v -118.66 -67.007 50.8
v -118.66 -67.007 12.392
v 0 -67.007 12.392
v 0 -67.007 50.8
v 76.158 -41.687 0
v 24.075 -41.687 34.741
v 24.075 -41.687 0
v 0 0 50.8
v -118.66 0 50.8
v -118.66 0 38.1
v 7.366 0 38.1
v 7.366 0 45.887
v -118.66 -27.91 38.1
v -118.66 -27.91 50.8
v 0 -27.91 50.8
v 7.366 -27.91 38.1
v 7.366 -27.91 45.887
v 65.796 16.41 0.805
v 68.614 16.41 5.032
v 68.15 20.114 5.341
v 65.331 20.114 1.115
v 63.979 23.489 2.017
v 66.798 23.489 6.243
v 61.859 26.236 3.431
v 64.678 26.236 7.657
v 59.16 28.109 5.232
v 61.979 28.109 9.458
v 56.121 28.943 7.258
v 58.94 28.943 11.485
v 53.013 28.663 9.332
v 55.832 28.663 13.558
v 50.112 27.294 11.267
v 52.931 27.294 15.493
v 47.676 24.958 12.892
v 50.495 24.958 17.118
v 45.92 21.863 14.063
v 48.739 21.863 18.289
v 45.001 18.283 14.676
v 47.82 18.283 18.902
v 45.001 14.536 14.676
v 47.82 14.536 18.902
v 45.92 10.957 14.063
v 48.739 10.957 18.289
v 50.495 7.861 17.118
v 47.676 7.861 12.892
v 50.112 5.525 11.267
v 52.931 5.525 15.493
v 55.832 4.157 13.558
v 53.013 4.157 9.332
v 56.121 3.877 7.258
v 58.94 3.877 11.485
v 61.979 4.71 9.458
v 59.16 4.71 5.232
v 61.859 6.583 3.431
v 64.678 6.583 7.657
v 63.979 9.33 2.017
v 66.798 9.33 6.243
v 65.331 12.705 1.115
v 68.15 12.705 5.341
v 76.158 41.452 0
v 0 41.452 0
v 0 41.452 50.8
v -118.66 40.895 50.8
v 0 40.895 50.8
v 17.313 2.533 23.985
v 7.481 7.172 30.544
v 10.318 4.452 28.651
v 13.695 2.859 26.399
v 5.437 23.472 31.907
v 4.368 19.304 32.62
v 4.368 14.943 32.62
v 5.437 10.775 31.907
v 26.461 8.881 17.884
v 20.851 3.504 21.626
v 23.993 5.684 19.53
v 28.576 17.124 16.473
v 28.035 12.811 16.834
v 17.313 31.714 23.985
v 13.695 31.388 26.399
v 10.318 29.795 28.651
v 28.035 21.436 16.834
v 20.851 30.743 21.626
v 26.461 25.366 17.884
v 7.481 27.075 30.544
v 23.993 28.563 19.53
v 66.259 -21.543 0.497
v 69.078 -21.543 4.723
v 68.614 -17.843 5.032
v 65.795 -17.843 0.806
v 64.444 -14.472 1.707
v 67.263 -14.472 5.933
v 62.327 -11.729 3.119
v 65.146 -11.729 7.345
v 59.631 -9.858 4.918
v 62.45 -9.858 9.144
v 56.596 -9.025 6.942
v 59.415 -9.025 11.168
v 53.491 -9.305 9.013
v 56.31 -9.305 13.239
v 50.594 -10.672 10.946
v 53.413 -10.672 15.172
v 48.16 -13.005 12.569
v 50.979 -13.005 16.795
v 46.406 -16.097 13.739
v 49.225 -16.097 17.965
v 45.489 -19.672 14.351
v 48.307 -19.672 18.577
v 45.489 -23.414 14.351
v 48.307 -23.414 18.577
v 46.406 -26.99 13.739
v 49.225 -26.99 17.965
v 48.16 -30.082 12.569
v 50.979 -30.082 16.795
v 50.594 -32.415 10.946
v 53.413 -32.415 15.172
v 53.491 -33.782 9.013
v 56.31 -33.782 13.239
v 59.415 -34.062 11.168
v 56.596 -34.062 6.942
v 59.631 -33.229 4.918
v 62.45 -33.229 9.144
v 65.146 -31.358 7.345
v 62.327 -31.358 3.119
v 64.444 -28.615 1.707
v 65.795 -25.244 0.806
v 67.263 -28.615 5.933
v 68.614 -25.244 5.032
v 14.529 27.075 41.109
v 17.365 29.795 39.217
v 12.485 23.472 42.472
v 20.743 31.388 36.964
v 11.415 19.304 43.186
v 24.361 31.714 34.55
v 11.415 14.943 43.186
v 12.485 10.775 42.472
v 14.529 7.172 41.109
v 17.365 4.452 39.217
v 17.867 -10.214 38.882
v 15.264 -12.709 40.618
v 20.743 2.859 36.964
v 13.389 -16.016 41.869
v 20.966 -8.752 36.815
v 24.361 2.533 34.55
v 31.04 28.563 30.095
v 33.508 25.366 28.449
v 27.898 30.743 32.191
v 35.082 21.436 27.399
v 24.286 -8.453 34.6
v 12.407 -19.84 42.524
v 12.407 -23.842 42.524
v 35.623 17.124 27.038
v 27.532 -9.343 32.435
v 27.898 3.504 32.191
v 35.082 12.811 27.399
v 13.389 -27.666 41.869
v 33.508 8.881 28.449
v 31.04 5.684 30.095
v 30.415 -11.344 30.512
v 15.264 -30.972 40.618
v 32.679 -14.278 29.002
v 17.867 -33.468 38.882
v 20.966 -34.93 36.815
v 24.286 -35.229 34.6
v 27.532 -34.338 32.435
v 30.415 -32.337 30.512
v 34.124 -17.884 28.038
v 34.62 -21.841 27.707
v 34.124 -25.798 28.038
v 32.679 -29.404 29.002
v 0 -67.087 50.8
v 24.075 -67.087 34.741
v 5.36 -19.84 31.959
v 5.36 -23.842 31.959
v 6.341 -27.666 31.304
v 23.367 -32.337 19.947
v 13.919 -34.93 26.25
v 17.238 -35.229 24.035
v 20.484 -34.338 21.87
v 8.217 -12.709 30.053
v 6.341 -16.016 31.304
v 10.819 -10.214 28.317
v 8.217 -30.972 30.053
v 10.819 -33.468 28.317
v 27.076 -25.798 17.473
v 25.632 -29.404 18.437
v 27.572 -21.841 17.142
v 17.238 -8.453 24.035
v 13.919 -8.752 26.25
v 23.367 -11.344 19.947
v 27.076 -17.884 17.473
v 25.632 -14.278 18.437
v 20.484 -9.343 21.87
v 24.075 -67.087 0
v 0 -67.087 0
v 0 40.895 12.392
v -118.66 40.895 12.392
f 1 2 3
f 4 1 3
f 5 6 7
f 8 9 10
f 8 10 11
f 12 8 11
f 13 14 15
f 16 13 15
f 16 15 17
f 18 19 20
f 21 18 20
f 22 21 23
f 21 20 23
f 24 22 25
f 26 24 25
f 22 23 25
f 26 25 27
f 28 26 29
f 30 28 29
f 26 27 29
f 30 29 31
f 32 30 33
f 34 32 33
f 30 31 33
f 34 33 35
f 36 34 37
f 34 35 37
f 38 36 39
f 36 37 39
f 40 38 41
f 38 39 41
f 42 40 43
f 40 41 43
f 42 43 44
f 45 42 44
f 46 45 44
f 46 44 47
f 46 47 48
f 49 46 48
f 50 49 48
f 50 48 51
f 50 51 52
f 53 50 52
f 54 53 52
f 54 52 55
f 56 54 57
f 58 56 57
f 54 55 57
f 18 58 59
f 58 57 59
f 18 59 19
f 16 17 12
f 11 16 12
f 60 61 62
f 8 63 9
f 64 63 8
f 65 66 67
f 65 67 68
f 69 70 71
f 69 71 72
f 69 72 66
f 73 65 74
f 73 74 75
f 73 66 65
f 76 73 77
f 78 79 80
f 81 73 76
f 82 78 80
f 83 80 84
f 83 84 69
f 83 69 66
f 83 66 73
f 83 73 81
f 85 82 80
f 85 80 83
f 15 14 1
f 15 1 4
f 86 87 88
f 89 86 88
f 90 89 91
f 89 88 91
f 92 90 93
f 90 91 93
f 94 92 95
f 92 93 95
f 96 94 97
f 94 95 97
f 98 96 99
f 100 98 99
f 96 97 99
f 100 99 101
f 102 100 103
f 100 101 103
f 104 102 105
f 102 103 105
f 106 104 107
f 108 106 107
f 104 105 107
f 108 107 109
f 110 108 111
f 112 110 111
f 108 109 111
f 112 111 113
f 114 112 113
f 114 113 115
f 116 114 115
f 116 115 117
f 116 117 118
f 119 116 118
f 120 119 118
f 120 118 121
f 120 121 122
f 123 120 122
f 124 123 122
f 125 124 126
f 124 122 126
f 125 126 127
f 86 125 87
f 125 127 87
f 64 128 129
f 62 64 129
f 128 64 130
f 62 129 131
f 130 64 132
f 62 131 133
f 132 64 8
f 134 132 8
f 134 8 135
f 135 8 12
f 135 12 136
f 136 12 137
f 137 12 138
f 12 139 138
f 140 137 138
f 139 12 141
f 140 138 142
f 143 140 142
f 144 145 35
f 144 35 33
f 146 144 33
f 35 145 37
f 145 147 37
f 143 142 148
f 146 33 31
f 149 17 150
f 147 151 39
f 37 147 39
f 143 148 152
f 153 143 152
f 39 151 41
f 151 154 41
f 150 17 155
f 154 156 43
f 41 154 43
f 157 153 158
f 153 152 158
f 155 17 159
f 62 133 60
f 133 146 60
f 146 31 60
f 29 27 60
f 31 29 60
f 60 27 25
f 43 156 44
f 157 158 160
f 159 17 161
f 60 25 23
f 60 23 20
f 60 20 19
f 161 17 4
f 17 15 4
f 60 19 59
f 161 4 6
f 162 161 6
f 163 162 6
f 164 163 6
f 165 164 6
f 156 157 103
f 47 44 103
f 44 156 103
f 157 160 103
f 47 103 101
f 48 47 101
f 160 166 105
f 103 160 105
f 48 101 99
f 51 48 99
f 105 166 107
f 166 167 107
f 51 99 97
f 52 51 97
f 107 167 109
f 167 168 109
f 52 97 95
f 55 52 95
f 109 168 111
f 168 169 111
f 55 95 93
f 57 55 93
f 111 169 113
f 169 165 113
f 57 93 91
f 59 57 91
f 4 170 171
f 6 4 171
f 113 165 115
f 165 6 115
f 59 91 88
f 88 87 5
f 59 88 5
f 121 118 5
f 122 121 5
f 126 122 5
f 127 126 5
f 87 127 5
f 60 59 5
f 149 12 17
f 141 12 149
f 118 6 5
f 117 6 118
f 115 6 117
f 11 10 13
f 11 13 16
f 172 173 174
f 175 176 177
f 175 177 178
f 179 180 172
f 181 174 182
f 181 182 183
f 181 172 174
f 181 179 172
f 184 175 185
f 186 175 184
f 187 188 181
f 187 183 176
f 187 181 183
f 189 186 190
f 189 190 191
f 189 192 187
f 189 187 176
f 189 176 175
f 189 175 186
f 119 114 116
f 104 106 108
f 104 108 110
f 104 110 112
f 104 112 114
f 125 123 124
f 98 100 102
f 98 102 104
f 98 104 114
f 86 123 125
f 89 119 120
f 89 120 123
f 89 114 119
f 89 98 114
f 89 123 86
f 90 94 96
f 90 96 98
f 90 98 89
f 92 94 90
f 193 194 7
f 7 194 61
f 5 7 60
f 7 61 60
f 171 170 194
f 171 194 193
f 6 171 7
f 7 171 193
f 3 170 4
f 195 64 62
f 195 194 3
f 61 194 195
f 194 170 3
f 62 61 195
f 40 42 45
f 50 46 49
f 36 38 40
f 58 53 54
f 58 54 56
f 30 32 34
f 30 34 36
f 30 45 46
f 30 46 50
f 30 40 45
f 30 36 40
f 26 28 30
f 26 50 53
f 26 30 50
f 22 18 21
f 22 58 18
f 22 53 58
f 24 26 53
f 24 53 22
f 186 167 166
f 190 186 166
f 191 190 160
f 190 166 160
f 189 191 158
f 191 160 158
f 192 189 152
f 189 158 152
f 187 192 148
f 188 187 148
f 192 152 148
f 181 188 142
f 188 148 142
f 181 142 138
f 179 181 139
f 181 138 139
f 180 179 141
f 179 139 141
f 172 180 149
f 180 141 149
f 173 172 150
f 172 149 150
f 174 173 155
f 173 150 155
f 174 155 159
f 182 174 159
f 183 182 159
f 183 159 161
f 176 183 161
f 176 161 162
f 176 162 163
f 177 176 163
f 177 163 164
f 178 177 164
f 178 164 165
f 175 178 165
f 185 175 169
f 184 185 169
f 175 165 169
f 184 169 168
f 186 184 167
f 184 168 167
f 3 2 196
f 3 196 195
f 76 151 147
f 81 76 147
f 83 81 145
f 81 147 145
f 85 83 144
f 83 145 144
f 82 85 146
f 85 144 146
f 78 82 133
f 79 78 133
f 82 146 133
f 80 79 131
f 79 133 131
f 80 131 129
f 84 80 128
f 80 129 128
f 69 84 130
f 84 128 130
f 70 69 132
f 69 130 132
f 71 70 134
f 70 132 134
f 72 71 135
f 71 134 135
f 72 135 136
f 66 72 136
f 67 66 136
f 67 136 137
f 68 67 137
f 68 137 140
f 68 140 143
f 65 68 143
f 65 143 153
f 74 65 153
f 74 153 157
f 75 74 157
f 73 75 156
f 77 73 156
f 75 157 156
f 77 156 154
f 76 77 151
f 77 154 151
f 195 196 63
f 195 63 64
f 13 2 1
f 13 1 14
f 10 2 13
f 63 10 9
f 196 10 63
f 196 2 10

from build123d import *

# Parameters (mm, degrees)
F0_W      = 76.1575698853
F0_H      = 108.5386313498
F1_DEPTH  = 50.8
F3_DEPTH  = 118.872
F5_DEPTH  = 25.4
F6_R      = 12.5535289189
F7_DEPTH  = 5.08
F8_R      = 12.5680957502
F9_DEPTH  = 5.08
F10_R     = 13.425374539
F11_DEPTH = 12.7
F12_R     = 14.6312815901
F13_DEPTH = 12.7
F14_W     = 118.6601817608
F14_H     = 107.9017259181
F15_DEPTH = 50.8
F16_W     = 126.0260776617
F16_H     = 27.9104653746
F17_DEPTH = 12.7
F18_W     = 118.6601817608
F18_H     = 12.3918522149
F19_DEPTH = 143.764


with BuildPart() as f1:
    # F0 (on Top) → F1 (new body)
    with BuildSketch(Plane.XY):
        with Locations((38.0787849426, -12.8173213452)):
            Rectangle(F0_W, F0_H)
    extrude(amount=F1_DEPTH)

    # F2 (on face) → F3 (cut)
    with BuildSketch(Plane.XZ.offset(67.0866370201)):
        Polygon((76.1575698853, 50.8), (0, 50.8), (76.1575698853, 0), align=None)
    extrude(amount=-F3_DEPTH, mode=Mode.SUBTRACT)

    # F4 (on face) → F5 (cut)
    with BuildSketch(Plane.XZ.offset(67.0866370201)):
        Polygon((76.1575698853, 0), (24.0748073295, 34.7411864877), (24.0748073295, 0), align=None)
    extrude(amount=-F5_DEPTH, mode=Mode.SUBTRACT)

    # F6 (on face) → F7 (cut)
    with BuildSketch(Plane(origin=(23.4511739981, 0, 35.1571736743), x_dir=(0.8319076559, 0, -0.5549140943), z_dir=(0.5549140943, 0, 0.8319076559))):
        with Locations((42.292021215, -21.5434860438)):
            Circle(F6_R)
    extrude(amount=-F7_DEPTH, mode=Mode.SUBTRACT)

    # F8 (on face) → F9 (cut)
    with BuildSketch(Plane(origin=(23.4511739981, 0, 35.1571736743), x_dir=(0.8319076559, 0, -0.5549140943), z_dir=(0.5549140943, 0, 0.8319076559))):
        with Locations((41.7207404971, 16.4096038789)):
            Circle(F8_R)
    extrude(amount=-F9_DEPTH, mode=Mode.SUBTRACT)

    # F10 (on face) → F11 (cut)
    with BuildSketch(Plane(origin=(23.4511739981, 0, 35.1571736743), x_dir=(0.8319076559, 0, -0.5549140943), z_dir=(0.5549140943, 0, 0.8319076559))):
        with Locations((0, -21.8407977372)):
            Circle(F10_R)
    extrude(amount=-F11_DEPTH, mode=Mode.SUBTRACT)

    # F12 (on face) → F13 (cut)
    with BuildSketch(Plane(origin=(23.4511739981, 0, 35.1571736743), x_dir=(0.8319076559, 0, -0.5549140943), z_dir=(0.5549140943, 0, 0.8319076559))):
        with Locations((0, 17.1235315502)):
            Circle(F12_R)
    extrude(amount=-F13_DEPTH, mode=Mode.SUBTRACT)

    # F14 (on Top) → F15 (join)
    with BuildSketch(Plane.XY):
        with Locations((-59.3300908804, -13.0562540144)):
            Rectangle(F14_W, F14_H)
    extrude(amount=F15_DEPTH)

    # F16 (on face) → F17 (cut)
    with BuildSketch(Plane.XY.offset(50.8)):
        with Locations((-55.64714293, -13.9552326873)):
            Rectangle(F16_W, F16_H)
    extrude(amount=-F17_DEPTH, mode=Mode.SUBTRACT)

    # F18 (on face) → F19 (cut)
    with BuildSketch(Plane.XZ.offset(67.0071169734)):
        with Locations((-59.3300908804, 6.1959261075)):
            Rectangle(F18_W, F18_H)
    extrude(amount=-F19_DEPTH, mode=Mode.SUBTRACT)


solid = f1.part
